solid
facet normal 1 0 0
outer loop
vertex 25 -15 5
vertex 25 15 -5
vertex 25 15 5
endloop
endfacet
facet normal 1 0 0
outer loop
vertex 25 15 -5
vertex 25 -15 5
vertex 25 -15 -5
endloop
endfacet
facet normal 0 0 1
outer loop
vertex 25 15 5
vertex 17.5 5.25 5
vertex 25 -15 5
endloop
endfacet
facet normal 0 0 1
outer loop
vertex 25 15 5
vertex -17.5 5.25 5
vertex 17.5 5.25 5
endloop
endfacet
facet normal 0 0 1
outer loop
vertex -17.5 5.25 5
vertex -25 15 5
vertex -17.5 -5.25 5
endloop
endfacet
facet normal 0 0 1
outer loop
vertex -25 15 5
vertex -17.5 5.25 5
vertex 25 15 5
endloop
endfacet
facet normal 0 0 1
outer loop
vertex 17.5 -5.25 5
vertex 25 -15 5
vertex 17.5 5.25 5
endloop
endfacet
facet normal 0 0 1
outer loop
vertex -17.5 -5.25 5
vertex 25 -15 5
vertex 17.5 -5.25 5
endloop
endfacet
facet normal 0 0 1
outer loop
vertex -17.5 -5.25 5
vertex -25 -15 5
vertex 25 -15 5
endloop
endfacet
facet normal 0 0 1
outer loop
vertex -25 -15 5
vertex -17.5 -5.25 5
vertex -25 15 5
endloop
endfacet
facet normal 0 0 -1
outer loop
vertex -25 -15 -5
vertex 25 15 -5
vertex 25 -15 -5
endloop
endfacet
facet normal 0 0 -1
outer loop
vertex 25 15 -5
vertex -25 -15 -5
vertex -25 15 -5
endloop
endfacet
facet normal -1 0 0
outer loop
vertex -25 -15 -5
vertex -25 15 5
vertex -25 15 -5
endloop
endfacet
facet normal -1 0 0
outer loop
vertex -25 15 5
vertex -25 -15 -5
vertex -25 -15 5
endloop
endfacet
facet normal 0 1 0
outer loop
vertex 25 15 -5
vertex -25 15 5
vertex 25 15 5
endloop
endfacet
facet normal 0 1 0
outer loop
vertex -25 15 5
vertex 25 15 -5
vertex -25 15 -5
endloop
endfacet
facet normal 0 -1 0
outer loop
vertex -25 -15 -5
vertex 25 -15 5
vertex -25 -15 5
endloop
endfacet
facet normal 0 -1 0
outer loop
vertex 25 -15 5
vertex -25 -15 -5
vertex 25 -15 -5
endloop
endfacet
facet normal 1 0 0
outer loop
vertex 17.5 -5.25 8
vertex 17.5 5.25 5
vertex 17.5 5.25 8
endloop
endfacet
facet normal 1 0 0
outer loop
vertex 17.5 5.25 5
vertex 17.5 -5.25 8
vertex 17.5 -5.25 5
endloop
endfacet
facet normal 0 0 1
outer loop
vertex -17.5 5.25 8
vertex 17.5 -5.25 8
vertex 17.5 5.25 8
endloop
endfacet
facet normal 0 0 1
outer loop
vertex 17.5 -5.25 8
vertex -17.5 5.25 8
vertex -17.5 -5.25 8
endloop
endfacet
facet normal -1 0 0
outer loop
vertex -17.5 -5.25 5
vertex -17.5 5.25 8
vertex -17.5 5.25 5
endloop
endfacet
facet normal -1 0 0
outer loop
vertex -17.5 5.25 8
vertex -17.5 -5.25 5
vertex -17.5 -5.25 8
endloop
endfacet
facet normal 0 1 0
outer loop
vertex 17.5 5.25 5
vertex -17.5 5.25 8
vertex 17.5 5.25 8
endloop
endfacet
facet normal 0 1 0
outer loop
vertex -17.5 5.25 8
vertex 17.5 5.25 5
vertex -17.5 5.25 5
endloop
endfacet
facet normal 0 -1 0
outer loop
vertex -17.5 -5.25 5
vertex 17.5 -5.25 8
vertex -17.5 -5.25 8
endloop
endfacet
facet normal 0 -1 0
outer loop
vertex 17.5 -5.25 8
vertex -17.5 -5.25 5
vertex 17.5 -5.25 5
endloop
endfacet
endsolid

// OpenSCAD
// Parameters
body_length = 50; //[25:100:1]
body_width  = 30; //[15:60:1]
body_height = 10; //[5:20:1]

// Robust minimums to avoid degenerate/blank renders
eps = 0.1;
L = max(body_length, eps);
W = max(body_width,  eps);
H = max(body_height, eps);

// Small overlap to guarantee connectivity between parts
overlap = max(min(L, min(W, H)) * 0.02, 0.5);

// Main Body Module
module main_body() {
  cube([L, W, H], center=true);
}

// Connected feature: a top rib (adds visible 3D detail, stays connected)
module top_rib() {
  rib_h = max(H * 0.35, eps);
  rib_w = max(W * 0.35, eps);
  rib_l = max(L * 0.70, eps);

  translate([0, 0, H/2 + rib_h/2 - overlap])
    cube([rib_l, rib_w, rib_h], center=true);
}

// Final Model (one connected solid)
color([0.85, 0.85, 0.8])
union() {
  main_body();
  top_rib();
}
